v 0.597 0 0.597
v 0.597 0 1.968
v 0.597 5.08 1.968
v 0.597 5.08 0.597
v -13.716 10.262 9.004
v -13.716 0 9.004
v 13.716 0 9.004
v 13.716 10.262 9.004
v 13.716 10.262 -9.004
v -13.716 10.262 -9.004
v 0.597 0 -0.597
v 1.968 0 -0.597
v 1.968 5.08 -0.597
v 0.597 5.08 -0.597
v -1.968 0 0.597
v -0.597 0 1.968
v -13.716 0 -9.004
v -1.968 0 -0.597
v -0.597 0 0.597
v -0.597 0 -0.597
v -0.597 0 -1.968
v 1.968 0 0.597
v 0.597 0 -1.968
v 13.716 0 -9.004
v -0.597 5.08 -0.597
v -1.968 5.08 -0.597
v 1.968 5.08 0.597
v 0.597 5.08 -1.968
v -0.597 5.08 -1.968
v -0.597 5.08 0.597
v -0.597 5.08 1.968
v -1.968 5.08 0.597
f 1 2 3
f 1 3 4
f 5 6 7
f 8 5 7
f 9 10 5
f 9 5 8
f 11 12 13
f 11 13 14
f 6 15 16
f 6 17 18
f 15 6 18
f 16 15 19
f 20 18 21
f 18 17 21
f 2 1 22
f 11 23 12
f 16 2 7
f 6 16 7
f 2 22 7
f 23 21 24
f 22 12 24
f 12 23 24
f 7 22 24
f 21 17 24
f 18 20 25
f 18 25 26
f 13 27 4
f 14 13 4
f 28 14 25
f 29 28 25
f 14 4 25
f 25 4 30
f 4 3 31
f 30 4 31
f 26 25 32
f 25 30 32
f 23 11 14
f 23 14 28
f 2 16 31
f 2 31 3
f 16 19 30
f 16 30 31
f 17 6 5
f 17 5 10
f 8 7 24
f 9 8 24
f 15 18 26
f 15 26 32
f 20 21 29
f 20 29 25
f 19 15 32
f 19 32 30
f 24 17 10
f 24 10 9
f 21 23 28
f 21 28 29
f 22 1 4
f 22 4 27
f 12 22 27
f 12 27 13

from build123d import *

# Parameters (mm, degrees)
SKETCH1_W           = 27.432
SKETCH1_H           = 18.0086
BOSS_EXTRUDE1_DEPTH = 10.2616
CUT_EXTRUDE1_DEPTH  = 5.08


with BuildPart() as part:
    # Sketch1 → Boss-Extrude1 (new body)
    with BuildSketch(Plane(origin=(0, 0, 0), x_dir=(1, 0, 0), z_dir=(0, 1, 0))):
        Rectangle(SKETCH1_W, SKETCH1_H)
    extrude(amount=BOSS_EXTRUDE1_DEPTH)

    # Sketch2 → Cut-Extrude1 (cut)
    with BuildSketch(Plane.XZ):
        Polygon((-0.5969, 0.5969), (-0.5969, 1.9685), (0.5969, 1.9685), (0.5969, 0.5969), (1.9685, 0.5969), (1.9685, -0.5969), (0.5969, -0.5969), (0.5969, -1.9685), (-0.5969, -1.9685), (-0.5969, -0.5969), (-1.9685, -0.5969), (-1.9685, 0.5969), align=None)
    extrude(amount=-CUT_EXTRUDE1_DEPTH, mode=Mode.SUBTRACT)


solid = part.part
